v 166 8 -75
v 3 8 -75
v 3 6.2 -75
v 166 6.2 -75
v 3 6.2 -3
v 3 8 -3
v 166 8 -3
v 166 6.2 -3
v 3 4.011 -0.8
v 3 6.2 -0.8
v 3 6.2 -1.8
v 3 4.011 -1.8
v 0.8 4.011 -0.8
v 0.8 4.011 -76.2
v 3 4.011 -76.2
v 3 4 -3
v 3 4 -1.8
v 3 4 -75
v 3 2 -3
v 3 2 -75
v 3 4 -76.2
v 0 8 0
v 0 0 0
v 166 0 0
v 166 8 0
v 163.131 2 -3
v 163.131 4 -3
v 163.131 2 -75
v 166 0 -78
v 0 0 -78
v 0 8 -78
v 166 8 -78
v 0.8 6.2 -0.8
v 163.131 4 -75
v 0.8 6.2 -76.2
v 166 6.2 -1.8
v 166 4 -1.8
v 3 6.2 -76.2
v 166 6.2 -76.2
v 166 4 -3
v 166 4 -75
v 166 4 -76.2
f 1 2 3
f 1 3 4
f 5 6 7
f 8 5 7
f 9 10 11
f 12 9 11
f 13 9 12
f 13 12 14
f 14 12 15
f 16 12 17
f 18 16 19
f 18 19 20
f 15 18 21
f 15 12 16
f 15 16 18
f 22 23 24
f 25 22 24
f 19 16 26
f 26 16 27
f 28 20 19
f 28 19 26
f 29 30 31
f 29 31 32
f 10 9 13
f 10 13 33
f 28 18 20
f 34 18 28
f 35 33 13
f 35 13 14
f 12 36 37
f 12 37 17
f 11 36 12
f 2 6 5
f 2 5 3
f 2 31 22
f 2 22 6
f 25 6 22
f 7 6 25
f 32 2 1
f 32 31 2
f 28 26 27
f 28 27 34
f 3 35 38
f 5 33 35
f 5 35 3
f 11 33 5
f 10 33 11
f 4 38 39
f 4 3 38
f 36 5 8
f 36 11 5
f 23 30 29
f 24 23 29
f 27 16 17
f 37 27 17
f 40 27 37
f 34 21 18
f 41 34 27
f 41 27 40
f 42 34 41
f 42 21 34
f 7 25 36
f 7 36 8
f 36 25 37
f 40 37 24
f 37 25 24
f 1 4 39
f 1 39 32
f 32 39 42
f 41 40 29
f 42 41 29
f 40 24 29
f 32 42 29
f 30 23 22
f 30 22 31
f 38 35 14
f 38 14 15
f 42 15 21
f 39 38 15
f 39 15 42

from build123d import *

# Parameters (mm, degrees)
SKETCH_1_W            = 166
SKETCH_1_H            = 78
EXTRUDE_293_DEPTH     = 8
SKETCH_2_W            = 163
SKETCH_2_H            = 72
CUT_EXTRUDE_531_DEPTH = 6
SKETCH_7_W            = 163
SKETCH_7_H            = 2.2
CUT_EXTRUDE_3_DEPTH   = 1.2
SKETCH_8_W            = 75.4
SKETCH_8_H            = 2.189311695
CUT_EXTRUDE_4_DEPTH   = 2.2
SKETCH_9_W            = 163
SKETCH_9_H            = 2.2
CUT_EXTRUDE_5_DEPTH   = 1.2
SKETCH_10_W           = 2.869065247
SKETCH_10_H           = 72
EXTRUDE_1_DEPTH       = 2


with BuildPart() as part:
    # Эскиз1 → Extrude 293 (new body)
    with BuildSketch(Plane(origin=(0, 0, 0), x_dir=(1, 0, 0), z_dir=(0, 1, 0))):
        with Locations((83, 39)):
            Rectangle(SKETCH_1_W, SKETCH_1_H)
    extrude(amount=EXTRUDE_293_DEPTH)

    # Эскиз2 → Cut-Extrude 531 (cut)
    with BuildSketch(Plane(origin=(0, 8, 0), x_dir=(1, 0, 0), z_dir=(0, 1, 0))):
        with Locations((84.5, 39)):
            Rectangle(SKETCH_2_W, SKETCH_2_H)
    extrude(amount=-CUT_EXTRUDE_531_DEPTH, mode=Mode.SUBTRACT)

    # Эскиз7 → Вырез-Вытянуть3 (cut)
    with BuildSketch(Plane.XY.offset(-75)):
        with Locations((84.5, 5.1)):
            Rectangle(SKETCH_7_W, SKETCH_7_H)
    extrude(amount=-CUT_EXTRUDE_3_DEPTH, mode=Mode.SUBTRACT)

    # Эскиз8 → Вырез-Вытянуть4 (cut)
    with BuildSketch(Plane(origin=(3, 0, 0), x_dir=(0, 0, -1), z_dir=(1, 0, 0))):
        with Locations((38.5, 5.105344153)):
            Rectangle(SKETCH_8_W, SKETCH_8_H)
    extrude(amount=-CUT_EXTRUDE_4_DEPTH, mode=Mode.SUBTRACT)

    # Эскиз9 → Вырез-Вытянуть5 (cut)
    with BuildSketch(Plane(origin=(0, 0, -3), x_dir=(-1, 0, 0), z_dir=(0, 0, -1))):
        with Locations((-84.5, 5.1)):
            Rectangle(SKETCH_9_W, SKETCH_9_H)
    extrude(amount=-CUT_EXTRUDE_5_DEPTH, mode=Mode.SUBTRACT)

    # Эскиз10 → Бобышка-Вытянуть1 (add)
    with BuildSketch(Plane(origin=(0, 2, 0), x_dir=(1, 0, 0), z_dir=(0, 1, 0))):
        with Locations((164.565467377, 39)):
            Rectangle(SKETCH_10_W, SKETCH_10_H)
    extrude(amount=EXTRUDE_1_DEPTH)


solid = part.part
